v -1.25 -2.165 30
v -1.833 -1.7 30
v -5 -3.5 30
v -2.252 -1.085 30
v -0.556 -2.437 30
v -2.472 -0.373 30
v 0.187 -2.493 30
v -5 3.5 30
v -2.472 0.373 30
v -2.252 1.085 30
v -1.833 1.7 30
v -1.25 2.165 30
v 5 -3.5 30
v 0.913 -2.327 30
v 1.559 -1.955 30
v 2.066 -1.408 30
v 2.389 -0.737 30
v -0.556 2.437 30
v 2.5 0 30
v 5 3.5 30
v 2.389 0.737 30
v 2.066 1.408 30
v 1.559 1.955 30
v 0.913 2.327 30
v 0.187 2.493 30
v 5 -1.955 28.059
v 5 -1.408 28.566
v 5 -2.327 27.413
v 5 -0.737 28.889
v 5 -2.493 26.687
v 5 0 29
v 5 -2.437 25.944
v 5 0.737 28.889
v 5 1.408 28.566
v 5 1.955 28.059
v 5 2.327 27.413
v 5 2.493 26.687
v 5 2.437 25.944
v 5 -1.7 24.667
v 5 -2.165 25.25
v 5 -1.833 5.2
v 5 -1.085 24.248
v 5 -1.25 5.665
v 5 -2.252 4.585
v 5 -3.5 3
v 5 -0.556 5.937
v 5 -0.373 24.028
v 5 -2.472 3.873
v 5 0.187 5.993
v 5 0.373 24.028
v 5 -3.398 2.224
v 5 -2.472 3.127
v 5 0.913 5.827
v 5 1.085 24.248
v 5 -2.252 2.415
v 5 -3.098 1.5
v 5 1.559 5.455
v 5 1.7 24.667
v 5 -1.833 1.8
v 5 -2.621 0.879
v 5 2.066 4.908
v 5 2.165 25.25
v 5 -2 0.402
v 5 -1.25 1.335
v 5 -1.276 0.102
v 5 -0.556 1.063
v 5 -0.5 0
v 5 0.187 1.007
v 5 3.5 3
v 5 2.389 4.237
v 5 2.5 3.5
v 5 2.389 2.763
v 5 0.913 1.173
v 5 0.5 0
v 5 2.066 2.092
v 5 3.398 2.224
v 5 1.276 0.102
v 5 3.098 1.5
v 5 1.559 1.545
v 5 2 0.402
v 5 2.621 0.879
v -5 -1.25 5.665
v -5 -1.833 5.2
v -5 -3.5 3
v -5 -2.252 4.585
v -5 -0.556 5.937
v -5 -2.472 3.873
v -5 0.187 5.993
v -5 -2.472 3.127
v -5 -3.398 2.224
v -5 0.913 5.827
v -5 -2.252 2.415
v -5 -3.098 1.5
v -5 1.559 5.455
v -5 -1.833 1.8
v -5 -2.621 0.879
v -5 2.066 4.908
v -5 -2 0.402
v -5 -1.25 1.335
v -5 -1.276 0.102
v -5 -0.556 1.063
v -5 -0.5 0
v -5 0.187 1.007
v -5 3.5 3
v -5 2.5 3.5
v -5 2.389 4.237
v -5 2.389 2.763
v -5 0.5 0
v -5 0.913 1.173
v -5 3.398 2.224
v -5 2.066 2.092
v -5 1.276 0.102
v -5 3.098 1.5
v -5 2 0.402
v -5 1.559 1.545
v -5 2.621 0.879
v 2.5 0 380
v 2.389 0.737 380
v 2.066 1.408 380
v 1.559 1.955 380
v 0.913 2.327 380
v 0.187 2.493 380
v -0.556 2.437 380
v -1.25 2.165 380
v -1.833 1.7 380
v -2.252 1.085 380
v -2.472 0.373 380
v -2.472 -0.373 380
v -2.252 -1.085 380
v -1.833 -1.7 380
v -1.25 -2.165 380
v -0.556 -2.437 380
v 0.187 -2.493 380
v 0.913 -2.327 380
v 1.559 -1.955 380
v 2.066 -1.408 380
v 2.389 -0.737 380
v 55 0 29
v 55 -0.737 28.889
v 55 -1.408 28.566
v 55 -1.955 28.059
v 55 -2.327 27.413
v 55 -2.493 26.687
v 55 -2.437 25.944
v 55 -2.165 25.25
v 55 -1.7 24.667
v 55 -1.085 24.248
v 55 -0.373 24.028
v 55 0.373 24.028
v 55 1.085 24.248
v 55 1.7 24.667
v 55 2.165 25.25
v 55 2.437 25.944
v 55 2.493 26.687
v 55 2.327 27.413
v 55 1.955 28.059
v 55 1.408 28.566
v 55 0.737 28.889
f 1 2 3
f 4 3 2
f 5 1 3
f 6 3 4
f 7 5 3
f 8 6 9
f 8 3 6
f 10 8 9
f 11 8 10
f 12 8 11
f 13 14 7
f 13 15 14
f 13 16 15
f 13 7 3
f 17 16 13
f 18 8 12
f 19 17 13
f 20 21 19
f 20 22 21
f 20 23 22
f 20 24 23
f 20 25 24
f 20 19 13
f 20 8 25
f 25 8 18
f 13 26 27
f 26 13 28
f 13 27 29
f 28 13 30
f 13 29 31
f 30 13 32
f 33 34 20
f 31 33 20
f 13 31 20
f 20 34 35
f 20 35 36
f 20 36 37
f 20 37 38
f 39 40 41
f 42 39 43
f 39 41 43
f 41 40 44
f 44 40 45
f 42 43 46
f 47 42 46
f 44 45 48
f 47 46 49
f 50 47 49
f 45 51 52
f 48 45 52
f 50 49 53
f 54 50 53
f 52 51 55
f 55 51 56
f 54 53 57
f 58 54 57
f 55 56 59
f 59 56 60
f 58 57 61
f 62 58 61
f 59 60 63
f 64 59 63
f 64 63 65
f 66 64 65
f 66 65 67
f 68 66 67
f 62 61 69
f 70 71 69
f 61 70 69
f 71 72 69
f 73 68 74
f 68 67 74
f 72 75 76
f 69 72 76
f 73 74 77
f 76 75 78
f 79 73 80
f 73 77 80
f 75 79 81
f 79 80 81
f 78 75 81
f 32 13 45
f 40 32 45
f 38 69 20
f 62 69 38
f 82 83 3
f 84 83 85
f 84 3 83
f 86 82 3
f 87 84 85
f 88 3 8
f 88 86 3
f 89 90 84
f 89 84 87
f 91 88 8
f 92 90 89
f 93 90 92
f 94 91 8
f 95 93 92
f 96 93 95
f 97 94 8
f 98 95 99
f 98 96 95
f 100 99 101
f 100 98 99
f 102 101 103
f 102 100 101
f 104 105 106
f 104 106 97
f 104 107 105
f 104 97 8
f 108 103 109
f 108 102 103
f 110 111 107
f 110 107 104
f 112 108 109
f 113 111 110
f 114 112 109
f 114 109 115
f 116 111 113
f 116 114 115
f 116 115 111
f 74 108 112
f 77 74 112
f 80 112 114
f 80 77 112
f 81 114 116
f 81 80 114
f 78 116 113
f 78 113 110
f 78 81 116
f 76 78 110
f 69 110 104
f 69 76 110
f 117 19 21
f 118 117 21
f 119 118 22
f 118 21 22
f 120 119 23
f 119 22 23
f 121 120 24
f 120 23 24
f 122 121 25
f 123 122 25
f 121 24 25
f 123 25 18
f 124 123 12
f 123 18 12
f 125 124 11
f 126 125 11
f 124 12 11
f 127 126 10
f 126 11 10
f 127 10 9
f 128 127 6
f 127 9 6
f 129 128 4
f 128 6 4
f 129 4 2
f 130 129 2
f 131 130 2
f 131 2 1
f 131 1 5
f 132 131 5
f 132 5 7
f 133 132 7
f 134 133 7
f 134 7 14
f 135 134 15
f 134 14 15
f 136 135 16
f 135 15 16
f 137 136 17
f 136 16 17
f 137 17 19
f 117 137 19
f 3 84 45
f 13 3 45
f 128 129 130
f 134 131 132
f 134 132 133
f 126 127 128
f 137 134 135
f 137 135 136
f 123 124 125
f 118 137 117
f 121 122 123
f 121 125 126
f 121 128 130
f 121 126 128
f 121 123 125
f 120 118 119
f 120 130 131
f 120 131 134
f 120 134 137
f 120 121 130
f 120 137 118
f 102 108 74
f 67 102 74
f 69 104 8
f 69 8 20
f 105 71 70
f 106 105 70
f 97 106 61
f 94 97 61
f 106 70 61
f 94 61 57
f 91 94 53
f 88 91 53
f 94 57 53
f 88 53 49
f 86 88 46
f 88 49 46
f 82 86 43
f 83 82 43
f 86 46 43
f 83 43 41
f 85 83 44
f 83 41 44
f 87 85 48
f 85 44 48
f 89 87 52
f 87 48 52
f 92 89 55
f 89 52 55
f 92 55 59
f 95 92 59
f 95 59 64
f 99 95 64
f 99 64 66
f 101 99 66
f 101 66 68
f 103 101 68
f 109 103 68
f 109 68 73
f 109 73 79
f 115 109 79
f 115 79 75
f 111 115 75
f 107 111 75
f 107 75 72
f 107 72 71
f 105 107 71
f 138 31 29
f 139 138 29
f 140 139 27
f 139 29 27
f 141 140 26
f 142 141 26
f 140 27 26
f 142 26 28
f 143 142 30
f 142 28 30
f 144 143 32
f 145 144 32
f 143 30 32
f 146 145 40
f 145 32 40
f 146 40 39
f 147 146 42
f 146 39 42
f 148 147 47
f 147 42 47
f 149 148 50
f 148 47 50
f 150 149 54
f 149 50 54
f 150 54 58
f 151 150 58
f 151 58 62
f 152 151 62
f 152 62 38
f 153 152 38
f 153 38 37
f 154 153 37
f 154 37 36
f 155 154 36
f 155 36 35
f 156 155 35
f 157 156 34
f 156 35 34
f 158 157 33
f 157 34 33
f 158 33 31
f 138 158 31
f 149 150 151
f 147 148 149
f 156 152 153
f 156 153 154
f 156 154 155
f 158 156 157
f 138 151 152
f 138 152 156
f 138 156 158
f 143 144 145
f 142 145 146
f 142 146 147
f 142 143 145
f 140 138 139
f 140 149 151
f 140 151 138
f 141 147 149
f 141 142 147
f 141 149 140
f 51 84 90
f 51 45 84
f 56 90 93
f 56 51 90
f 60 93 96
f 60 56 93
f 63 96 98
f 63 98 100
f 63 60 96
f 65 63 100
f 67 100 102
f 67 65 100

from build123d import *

# Parameters (mm, degrees)
SKETCH1_W           = 10
SKETCH1_H           = 7
BOSS_EXTRUDE1_DEPTH = 30
SKETCH2_R           = 2.5
CUT_EXTRUDE2_DEPTH  = 20
SKETCH2_3_R         = 2.5
BOSS_EXTRUDE2_DEPTH = 50
FILLET1_R           = 3
SKETCH3_R           = 2.5
BOSS_EXTRUDE3_DEPTH = 350


with BuildPart() as part:
    # Sketch1 → Boss-Extrude1 (new body)
    with BuildSketch(Plane.XY):
        Rectangle(SKETCH1_W, SKETCH1_H)
    extrude(amount=BOSS_EXTRUDE1_DEPTH)

    # Sketch2 → Cut-Extrude2 (cut)
    with BuildSketch(Plane(origin=(5, 0, 0), x_dir=(0, 0, -1), z_dir=(1, 0, 0))):
        with Locations((-3.5, 0)):
            Circle(SKETCH2_R)
    extrude(amount=-CUT_EXTRUDE2_DEPTH, mode=Mode.SUBTRACT)

    # Sketch2<3> → Boss-Extrude2 (add)
    with BuildSketch(Plane(origin=(5, 0, 0), x_dir=(0, 0, -1), z_dir=(1, 0, 0))):
        with Locations((-26.5, 0)):
            Circle(SKETCH2_3_R)
    extrude(amount=BOSS_EXTRUDE2_DEPTH)

    # Fillet1
    fillet1_edges = [part.edges().sort_by_distance(p)[0] for p in [
        (0, -3.5, 0),
        (0, 3.5, 0),
    ]]
    fillet(fillet1_edges, radius=FILLET1_R)

    # Sketch3 → Boss-Extrude3 (add)
    with BuildSketch(Plane.XY.offset(30)):
        Circle(SKETCH3_R)
    extrude(amount=BOSS_EXTRUDE3_DEPTH)


solid = part.part
